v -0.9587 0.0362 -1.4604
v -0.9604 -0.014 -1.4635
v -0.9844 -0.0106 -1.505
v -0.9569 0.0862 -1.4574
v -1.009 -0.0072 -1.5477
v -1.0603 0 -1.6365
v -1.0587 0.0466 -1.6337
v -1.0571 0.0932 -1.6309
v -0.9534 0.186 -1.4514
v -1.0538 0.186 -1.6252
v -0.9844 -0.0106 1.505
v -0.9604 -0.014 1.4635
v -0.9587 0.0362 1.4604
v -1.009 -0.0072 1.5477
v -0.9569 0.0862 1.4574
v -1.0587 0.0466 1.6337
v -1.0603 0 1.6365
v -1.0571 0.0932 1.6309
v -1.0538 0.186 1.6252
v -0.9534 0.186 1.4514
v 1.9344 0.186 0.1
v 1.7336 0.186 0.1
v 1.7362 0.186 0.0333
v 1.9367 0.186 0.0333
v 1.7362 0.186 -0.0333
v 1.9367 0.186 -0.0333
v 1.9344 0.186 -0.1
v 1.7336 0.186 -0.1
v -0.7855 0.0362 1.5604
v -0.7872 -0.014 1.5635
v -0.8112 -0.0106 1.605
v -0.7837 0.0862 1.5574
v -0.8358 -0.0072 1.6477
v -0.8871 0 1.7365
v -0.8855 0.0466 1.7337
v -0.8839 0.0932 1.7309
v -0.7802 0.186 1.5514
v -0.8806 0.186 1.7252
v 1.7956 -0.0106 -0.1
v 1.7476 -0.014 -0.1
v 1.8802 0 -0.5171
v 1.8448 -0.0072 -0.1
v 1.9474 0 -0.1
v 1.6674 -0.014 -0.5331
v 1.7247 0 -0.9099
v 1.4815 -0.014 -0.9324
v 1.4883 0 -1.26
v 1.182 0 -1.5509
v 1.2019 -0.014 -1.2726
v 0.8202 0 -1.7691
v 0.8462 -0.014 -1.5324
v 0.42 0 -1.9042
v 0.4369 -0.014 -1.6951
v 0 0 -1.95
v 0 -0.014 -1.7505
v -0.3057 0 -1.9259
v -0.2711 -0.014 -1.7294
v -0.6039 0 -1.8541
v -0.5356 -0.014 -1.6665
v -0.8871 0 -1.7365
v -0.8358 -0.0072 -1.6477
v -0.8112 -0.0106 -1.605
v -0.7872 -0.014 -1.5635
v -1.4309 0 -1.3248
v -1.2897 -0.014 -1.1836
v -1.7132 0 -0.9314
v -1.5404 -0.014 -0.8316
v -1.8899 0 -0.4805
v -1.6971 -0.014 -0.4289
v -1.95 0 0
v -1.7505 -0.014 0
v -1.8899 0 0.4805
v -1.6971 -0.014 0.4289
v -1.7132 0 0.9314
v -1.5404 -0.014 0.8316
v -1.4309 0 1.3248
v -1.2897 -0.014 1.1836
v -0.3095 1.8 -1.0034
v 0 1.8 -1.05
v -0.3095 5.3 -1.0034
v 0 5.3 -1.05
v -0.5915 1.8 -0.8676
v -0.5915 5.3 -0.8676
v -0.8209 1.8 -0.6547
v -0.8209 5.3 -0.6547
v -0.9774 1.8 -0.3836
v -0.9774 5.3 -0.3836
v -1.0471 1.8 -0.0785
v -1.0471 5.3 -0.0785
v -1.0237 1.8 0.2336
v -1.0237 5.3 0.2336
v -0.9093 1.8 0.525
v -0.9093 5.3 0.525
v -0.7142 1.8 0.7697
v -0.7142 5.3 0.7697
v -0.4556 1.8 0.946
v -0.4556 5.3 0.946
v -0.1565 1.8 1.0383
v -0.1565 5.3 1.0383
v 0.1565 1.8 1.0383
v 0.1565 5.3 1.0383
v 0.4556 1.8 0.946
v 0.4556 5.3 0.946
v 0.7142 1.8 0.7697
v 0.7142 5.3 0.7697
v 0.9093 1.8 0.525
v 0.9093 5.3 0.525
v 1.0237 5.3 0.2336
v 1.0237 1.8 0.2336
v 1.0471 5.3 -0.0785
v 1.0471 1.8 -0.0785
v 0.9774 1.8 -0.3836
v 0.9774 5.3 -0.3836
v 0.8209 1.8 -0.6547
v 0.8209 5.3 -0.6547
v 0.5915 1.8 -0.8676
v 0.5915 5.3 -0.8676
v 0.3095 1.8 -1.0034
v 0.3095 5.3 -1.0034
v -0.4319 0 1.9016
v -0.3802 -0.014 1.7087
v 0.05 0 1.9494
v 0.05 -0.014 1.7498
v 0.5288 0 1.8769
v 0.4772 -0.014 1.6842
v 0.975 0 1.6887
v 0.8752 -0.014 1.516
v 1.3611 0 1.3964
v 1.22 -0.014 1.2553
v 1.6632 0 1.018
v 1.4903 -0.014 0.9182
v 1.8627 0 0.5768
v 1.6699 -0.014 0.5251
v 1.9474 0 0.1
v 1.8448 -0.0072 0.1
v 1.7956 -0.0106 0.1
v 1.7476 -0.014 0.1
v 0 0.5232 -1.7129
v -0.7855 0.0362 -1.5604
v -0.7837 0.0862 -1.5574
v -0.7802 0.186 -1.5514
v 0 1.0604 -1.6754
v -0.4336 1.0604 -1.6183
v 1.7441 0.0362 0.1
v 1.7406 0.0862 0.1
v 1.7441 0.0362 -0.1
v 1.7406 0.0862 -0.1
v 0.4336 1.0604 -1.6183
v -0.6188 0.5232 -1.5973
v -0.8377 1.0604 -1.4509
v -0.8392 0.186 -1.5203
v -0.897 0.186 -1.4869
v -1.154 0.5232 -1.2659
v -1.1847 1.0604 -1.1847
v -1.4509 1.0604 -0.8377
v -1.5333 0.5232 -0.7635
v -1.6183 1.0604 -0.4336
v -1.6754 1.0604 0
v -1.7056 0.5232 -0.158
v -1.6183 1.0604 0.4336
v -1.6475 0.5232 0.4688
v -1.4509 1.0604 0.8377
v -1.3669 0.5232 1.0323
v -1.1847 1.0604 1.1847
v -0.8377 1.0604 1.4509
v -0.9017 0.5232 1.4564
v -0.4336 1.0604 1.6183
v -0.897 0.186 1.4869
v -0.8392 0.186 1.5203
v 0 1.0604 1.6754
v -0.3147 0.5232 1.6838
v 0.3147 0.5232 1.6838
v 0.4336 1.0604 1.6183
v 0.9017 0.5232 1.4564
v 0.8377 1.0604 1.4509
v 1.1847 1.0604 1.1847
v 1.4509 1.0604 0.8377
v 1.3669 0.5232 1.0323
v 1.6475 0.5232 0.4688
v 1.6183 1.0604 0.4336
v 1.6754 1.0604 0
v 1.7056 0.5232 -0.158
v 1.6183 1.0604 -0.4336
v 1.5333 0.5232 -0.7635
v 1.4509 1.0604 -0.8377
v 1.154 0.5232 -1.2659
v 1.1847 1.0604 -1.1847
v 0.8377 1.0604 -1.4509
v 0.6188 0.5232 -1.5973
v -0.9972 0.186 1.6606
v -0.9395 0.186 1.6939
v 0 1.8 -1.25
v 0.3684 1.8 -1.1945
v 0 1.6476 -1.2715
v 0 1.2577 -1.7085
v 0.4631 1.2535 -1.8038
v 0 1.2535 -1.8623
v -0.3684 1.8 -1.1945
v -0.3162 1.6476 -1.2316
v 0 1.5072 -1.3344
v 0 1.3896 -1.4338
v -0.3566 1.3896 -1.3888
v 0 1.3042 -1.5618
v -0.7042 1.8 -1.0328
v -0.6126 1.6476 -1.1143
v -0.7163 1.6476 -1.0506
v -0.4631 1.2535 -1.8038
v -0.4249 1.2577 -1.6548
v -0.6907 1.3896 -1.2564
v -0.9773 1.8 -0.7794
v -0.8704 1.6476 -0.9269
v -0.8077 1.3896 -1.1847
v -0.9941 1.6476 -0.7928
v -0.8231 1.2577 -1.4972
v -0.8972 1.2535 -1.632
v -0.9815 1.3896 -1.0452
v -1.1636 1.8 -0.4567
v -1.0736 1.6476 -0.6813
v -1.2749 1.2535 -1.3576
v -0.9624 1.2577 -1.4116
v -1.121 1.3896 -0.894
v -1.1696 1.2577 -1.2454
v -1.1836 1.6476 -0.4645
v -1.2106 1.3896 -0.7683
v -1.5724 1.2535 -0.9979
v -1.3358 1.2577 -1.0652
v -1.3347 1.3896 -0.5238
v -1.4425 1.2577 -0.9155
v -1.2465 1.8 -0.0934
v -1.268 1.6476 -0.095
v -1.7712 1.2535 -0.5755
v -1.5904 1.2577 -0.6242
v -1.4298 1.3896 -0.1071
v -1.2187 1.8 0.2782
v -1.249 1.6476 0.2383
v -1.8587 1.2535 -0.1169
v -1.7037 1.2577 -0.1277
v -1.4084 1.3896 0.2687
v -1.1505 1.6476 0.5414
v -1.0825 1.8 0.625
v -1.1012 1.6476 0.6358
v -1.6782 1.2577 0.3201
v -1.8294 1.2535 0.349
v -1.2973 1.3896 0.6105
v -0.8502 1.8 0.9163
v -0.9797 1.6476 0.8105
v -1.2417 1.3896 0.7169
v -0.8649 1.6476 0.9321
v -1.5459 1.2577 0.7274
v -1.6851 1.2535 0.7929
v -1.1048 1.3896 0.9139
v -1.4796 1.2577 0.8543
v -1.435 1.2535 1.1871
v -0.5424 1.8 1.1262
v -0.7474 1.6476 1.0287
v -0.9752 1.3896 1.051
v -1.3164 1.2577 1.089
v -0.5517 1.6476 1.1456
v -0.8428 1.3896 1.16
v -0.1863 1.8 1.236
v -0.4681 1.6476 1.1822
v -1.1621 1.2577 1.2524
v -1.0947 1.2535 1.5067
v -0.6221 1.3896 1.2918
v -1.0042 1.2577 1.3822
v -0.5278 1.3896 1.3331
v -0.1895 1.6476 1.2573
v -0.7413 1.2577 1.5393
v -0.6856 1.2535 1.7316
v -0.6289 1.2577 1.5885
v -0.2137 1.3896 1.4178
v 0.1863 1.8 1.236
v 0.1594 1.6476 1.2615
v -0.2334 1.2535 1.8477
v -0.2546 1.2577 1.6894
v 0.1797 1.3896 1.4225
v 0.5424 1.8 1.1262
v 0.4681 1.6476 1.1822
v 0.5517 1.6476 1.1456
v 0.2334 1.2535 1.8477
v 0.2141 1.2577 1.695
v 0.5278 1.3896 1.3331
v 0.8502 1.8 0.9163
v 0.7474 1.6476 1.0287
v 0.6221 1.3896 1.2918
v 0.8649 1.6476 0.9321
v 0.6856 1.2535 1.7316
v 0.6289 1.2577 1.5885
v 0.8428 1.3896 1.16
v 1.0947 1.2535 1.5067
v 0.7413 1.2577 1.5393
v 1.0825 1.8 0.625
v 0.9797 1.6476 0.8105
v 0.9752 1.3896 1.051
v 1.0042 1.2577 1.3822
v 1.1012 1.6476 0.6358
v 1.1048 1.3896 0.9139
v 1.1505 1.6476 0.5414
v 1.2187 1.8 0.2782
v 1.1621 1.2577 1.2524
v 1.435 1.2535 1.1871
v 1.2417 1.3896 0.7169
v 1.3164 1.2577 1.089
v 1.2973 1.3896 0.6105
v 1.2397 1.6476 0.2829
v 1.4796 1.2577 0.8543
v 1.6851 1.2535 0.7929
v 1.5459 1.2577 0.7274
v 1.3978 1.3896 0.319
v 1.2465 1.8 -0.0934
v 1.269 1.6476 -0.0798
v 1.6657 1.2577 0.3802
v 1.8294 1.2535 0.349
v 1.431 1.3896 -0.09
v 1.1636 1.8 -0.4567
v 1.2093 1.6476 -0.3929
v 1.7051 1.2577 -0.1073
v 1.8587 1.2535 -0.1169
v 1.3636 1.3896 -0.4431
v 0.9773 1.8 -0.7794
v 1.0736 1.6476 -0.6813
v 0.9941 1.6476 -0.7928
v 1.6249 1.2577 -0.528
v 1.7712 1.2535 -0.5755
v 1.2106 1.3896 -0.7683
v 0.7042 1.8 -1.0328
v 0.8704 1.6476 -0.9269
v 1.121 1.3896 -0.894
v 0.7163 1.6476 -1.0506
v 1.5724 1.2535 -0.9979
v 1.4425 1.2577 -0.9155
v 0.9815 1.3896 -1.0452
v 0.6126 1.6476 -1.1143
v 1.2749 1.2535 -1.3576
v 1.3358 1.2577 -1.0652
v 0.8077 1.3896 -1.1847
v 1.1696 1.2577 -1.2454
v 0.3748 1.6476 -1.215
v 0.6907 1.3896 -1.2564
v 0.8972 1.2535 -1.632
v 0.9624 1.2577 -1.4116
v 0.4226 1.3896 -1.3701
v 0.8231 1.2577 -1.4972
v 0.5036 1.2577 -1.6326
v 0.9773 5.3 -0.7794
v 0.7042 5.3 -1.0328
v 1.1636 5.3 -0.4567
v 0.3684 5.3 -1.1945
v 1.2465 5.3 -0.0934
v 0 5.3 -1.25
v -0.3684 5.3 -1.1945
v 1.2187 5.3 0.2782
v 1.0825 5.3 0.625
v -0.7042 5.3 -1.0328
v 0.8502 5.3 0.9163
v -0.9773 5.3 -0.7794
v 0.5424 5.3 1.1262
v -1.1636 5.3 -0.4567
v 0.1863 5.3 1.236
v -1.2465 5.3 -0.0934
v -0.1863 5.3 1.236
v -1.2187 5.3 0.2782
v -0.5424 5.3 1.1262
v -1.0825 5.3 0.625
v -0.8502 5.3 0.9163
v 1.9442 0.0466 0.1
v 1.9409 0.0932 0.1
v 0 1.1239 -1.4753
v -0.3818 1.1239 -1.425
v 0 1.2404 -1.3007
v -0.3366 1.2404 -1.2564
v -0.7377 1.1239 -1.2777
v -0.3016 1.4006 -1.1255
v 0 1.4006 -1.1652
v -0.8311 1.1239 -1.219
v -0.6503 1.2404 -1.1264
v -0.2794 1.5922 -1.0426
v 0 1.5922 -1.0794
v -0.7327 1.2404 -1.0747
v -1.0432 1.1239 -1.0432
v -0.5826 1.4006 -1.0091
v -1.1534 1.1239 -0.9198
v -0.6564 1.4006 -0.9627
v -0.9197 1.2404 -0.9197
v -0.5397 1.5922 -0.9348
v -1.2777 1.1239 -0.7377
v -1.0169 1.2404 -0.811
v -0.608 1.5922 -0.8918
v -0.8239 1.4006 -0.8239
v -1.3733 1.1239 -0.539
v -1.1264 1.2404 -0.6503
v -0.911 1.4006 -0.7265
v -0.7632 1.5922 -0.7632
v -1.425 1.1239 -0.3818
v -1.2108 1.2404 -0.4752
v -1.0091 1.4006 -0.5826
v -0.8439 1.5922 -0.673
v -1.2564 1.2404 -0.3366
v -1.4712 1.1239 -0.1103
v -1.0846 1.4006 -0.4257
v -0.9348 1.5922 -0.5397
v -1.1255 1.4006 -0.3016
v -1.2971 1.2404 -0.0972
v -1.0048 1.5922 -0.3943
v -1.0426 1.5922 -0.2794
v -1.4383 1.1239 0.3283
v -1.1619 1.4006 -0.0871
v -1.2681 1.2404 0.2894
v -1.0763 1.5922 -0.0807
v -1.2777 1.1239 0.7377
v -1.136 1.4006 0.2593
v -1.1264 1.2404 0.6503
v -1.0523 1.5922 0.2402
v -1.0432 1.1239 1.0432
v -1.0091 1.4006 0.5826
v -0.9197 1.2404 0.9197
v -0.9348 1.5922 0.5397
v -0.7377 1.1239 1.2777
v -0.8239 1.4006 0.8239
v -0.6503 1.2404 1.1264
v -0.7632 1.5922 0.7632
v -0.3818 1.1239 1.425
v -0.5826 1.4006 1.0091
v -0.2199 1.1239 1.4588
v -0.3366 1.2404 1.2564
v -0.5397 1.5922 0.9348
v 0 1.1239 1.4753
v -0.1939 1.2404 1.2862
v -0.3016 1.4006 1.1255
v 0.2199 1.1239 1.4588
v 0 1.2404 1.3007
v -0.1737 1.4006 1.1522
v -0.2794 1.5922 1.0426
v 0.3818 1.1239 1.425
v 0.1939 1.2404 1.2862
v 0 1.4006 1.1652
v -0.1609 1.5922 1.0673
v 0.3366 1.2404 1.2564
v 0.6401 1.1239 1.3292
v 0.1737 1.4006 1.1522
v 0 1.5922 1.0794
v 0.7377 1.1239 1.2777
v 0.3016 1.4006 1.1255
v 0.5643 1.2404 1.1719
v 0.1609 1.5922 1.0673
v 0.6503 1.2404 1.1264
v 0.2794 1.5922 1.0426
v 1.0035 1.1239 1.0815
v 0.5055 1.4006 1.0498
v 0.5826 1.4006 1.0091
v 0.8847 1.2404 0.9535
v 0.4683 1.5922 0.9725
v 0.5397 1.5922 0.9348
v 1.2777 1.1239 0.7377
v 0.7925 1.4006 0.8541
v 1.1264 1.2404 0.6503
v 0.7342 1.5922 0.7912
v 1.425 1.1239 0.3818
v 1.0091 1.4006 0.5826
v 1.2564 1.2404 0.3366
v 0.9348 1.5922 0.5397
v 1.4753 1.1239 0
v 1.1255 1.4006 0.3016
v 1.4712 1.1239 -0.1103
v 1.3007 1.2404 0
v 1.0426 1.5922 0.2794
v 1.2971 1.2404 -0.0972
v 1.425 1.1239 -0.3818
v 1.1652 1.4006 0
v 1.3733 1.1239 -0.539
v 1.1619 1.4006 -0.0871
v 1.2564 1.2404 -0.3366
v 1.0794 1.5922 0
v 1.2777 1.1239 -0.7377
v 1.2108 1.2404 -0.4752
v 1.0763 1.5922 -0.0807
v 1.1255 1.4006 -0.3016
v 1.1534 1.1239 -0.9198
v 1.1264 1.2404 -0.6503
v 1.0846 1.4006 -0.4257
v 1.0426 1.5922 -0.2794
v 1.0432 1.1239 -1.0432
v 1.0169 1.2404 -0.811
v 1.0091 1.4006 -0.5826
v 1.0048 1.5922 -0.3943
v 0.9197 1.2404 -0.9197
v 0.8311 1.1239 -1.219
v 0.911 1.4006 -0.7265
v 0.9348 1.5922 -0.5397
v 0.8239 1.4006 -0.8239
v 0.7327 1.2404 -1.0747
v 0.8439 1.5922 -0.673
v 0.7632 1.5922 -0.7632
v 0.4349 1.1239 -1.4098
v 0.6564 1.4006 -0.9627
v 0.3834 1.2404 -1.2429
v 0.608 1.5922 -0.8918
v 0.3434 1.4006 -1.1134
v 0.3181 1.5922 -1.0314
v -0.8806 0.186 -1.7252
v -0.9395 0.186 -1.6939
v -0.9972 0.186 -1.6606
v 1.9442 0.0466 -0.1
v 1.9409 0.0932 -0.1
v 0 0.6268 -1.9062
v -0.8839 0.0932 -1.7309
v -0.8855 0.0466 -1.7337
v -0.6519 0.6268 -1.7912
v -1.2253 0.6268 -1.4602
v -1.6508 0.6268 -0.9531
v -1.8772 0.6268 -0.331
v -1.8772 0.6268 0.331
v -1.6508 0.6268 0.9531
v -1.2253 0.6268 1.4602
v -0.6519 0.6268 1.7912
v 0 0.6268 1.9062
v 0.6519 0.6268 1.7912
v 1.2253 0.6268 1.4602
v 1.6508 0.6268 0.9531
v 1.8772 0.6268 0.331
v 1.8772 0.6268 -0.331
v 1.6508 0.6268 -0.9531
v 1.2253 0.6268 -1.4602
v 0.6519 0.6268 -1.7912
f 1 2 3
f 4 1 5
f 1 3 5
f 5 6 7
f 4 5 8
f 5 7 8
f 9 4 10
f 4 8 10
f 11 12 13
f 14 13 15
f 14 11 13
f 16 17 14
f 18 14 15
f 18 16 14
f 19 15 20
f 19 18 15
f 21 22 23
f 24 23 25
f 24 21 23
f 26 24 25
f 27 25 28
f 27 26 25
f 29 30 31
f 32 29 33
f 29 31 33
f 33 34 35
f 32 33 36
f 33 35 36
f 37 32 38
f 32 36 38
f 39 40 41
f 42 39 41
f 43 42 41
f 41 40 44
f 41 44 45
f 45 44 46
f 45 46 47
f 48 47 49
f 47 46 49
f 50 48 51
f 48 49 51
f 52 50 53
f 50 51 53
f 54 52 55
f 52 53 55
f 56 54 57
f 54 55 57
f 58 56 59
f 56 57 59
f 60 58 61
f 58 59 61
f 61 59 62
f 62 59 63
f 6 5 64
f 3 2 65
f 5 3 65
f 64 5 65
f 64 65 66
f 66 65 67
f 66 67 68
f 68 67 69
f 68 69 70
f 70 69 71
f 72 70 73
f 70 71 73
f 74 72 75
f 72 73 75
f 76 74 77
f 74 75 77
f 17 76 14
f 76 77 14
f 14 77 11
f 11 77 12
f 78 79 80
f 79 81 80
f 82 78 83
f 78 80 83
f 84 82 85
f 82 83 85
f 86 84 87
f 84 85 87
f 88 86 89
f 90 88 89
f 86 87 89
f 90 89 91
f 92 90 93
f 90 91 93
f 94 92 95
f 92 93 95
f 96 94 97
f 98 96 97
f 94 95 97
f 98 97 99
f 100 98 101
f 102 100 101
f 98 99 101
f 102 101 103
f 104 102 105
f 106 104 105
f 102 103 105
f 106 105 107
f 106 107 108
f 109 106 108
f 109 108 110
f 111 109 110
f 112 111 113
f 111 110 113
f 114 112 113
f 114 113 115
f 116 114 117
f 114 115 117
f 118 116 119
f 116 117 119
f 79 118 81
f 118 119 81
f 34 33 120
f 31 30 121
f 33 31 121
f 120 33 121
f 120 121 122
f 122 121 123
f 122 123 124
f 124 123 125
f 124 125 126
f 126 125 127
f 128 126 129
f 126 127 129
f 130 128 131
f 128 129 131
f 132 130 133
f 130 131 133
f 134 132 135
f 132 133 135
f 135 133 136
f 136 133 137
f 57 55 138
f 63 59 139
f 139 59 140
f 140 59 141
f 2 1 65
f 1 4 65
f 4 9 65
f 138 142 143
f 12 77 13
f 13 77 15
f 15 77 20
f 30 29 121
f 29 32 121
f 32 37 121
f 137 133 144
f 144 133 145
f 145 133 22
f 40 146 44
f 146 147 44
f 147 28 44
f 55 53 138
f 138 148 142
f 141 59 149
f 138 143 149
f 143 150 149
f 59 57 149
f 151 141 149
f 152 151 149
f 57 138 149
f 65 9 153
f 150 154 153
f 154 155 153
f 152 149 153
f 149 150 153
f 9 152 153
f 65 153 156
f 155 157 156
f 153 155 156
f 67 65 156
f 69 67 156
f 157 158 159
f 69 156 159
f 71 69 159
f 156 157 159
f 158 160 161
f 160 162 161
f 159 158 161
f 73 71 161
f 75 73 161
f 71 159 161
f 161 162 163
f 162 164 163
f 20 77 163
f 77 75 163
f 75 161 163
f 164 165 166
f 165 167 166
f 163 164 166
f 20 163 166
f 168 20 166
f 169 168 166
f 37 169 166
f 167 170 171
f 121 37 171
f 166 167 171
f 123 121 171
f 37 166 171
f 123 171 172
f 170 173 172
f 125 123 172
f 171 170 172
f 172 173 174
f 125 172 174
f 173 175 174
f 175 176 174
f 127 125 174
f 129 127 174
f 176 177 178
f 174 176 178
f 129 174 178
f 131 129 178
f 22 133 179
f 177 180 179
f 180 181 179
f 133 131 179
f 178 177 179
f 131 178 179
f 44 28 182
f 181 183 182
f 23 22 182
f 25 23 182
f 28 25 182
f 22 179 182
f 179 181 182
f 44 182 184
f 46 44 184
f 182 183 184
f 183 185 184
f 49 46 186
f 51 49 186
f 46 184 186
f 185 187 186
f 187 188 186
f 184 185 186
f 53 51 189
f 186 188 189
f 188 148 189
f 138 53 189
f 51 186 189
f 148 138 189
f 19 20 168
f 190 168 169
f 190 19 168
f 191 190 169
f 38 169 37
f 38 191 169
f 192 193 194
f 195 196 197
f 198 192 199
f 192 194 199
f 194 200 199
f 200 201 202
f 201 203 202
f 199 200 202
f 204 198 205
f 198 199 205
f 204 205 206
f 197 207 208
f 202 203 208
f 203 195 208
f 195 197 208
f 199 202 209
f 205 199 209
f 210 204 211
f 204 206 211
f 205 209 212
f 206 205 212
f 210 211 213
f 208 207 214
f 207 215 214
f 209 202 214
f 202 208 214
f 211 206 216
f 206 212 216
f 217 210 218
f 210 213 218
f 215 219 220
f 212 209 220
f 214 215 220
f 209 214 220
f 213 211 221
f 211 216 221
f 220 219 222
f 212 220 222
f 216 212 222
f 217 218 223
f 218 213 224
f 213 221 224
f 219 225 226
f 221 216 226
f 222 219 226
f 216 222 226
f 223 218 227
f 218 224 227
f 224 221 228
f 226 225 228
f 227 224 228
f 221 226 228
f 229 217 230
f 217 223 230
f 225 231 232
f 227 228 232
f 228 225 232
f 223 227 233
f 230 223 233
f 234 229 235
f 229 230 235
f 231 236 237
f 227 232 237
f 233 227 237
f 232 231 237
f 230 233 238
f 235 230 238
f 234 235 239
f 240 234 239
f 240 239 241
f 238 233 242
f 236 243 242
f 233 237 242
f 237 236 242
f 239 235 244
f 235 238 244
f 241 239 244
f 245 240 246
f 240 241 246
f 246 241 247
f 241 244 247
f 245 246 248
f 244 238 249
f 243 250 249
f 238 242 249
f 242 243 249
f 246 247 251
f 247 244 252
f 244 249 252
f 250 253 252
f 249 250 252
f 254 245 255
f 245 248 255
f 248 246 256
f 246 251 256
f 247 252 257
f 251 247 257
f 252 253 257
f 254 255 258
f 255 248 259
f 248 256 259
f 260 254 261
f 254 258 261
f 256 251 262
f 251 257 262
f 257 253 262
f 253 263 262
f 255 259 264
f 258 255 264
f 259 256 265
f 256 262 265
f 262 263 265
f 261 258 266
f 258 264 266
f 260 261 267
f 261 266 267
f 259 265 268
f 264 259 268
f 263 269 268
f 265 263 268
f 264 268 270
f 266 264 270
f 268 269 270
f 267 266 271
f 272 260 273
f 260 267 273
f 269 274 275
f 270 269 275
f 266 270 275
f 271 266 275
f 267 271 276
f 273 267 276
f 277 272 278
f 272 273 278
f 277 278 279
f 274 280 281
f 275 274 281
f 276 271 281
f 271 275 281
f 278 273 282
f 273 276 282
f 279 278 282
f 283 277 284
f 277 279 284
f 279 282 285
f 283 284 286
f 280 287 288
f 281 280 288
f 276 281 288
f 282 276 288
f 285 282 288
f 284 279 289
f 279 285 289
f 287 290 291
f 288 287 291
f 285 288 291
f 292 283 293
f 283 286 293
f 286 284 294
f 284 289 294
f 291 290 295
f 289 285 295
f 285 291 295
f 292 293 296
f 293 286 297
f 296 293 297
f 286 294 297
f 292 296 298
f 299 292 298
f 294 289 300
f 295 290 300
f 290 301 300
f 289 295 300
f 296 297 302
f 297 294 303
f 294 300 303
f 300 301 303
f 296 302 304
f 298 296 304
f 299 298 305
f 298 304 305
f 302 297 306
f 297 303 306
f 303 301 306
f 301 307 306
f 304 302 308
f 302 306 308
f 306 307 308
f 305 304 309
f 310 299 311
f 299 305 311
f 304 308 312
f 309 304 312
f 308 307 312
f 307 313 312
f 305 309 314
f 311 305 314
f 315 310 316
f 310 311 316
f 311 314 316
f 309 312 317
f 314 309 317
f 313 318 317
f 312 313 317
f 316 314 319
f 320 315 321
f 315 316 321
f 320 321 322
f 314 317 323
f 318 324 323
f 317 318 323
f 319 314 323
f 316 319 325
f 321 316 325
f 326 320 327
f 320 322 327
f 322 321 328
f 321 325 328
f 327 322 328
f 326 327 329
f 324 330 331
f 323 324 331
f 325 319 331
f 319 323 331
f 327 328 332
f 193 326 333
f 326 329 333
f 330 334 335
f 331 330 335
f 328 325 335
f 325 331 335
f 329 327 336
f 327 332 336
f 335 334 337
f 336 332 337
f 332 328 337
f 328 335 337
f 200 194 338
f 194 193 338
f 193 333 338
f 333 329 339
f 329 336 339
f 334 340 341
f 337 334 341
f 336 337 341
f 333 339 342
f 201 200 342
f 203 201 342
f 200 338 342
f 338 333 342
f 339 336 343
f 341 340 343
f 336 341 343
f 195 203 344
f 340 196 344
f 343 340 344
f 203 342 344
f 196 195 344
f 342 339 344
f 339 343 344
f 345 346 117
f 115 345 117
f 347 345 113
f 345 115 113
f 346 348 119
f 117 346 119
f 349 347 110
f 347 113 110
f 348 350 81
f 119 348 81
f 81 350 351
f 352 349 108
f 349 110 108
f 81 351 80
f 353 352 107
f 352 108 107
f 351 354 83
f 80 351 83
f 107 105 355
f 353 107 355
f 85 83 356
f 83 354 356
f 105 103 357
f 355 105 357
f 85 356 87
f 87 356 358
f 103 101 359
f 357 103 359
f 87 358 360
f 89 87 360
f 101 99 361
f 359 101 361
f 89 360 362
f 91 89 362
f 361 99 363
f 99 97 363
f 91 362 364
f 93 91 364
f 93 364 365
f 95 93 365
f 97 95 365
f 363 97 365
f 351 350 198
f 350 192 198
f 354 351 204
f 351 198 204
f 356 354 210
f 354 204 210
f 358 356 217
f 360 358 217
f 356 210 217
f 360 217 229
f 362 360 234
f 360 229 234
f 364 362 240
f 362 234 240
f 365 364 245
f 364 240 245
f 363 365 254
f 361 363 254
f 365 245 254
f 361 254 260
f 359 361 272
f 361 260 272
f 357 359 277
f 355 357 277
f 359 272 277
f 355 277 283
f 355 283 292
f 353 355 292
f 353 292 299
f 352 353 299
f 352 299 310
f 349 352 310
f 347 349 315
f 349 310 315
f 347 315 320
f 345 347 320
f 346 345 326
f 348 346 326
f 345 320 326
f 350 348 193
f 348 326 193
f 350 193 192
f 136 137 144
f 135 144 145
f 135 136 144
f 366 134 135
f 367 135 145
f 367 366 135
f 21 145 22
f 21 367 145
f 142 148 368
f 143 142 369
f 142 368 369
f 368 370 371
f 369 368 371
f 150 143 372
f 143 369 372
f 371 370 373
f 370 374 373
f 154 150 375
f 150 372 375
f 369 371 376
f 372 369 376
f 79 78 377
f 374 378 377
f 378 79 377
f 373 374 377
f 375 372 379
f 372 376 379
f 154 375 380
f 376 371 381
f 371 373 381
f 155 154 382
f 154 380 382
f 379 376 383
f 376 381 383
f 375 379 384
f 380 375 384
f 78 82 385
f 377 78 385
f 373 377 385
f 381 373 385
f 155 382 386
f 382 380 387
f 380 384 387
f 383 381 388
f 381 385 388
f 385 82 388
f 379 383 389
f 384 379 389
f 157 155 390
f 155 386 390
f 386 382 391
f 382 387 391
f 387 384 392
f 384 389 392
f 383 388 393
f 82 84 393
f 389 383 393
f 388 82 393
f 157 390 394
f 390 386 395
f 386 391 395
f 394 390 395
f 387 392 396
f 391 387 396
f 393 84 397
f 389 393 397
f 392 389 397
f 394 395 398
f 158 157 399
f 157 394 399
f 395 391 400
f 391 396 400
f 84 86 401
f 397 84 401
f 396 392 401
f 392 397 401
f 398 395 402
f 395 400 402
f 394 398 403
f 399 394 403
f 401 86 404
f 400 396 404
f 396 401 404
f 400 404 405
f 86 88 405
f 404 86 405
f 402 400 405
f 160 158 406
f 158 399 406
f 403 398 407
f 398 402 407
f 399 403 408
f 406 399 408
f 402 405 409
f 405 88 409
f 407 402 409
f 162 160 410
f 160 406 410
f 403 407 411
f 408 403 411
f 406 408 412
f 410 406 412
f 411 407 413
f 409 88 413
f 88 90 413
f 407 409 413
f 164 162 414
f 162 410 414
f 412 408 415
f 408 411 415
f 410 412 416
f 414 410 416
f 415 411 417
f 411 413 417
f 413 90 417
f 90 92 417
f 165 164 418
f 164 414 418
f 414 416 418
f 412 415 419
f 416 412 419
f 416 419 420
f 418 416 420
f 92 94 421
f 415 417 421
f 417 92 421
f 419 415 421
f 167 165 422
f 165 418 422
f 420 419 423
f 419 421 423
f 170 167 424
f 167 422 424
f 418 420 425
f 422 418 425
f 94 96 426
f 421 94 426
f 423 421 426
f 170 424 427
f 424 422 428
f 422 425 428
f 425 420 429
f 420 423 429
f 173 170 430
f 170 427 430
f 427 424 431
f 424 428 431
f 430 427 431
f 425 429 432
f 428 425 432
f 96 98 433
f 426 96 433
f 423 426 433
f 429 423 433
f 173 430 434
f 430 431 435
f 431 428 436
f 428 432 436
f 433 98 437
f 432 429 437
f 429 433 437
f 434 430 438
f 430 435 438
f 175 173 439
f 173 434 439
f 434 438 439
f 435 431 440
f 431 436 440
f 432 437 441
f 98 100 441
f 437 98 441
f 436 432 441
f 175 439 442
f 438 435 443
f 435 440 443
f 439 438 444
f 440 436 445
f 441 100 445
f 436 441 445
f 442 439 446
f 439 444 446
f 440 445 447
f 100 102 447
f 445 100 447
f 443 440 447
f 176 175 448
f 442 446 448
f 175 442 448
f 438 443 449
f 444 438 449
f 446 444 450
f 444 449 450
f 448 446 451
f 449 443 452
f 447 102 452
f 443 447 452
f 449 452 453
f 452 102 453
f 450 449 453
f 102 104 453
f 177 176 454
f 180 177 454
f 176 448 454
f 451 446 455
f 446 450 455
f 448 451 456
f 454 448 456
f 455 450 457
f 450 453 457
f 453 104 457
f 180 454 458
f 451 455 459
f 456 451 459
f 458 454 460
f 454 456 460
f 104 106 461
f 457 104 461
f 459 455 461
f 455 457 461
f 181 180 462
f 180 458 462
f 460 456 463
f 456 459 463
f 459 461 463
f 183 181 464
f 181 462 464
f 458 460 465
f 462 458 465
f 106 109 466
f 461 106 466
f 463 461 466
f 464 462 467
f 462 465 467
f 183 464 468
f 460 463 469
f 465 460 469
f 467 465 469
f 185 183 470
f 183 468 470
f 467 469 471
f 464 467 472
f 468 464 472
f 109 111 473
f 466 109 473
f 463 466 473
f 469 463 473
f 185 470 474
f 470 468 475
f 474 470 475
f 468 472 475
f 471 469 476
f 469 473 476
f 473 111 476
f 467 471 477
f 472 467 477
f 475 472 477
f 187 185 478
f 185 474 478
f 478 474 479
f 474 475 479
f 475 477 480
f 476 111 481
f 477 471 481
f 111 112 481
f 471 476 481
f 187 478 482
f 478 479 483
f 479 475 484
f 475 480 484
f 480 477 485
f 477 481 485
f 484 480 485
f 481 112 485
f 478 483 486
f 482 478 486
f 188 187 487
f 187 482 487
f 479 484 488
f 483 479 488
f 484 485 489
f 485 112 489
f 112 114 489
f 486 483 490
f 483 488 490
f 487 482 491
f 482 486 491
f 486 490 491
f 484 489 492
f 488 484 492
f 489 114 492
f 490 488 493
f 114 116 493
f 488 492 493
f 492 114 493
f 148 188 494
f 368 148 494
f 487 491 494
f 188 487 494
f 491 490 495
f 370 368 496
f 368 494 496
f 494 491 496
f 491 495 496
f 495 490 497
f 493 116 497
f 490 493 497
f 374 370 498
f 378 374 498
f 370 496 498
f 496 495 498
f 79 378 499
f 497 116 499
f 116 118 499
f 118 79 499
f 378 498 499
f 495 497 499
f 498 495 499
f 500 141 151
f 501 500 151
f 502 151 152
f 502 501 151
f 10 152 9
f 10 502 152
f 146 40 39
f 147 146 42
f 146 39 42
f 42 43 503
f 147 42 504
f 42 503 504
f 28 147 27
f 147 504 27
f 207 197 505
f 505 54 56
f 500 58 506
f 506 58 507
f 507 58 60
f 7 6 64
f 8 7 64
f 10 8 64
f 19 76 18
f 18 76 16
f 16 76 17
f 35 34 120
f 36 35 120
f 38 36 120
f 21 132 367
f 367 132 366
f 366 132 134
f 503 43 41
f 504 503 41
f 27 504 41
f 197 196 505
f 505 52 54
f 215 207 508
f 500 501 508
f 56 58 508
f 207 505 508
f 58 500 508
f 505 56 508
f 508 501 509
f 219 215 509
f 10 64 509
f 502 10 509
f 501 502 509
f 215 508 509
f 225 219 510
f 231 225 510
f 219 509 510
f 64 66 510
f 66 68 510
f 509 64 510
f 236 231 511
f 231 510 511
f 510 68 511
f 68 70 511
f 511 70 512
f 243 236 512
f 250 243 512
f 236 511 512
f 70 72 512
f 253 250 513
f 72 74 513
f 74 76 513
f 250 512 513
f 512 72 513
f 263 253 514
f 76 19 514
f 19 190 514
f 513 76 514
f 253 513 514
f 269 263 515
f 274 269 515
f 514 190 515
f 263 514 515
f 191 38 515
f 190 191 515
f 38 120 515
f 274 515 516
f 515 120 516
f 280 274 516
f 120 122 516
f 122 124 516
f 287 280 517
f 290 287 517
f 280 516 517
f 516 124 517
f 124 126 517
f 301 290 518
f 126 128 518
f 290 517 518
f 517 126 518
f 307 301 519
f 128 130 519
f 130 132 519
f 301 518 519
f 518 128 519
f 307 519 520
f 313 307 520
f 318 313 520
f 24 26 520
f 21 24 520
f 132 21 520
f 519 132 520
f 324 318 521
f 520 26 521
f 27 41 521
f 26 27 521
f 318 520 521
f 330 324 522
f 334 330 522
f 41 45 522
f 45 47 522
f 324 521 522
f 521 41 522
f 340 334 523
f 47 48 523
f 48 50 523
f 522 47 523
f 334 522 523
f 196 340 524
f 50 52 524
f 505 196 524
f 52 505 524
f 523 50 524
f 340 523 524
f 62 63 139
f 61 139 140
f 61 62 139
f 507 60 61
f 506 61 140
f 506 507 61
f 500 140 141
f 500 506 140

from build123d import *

# Parameters (mm, degrees)
SZKIC8_W                    = 0.2
SZKIC8_H                    = 0.4
WYTNIJ_WYCI_GNI_CIE11_DEPTH = 0.26
SZYK_KO_OWY1_COUNT          = 3


with BuildPart() as part:
    # Szkic2 → Obrót-cienka ścianka3 (revolve)
    with BuildSketch(Plane(origin=(0, 0, 0), x_dir=(0, 0, -1), z_dir=(1, 0, 0))):
        with BuildLine():
            Line((1.25, 5.3), (1.25, 1.8))
            ThreePointArc((1.25, 1.8), (1.433795811, 1.38964102), (1.862343608, 1.25354481))
            Line((1.862343608, 1.25354481), (1.95, 0))
            Line((1.95, 0), (1.75048719, -0.013951295))
            Line((1.75048719, -0.013951295), (1.675359173, 1.060429406))
            ThreePointArc((1.675359173, 1.060429406), (1.227295617, 1.315737995), (1.05, 1.8))
            Line((1.05, 1.8), (1.05, 5.3))
            Line((1.05, 5.3), (1.25, 5.3))
        make_face()
    revolve(axis=Axis((0, 0, 0), (0, 1, 0)))

    # Szkic8 → Wytnij-wyciągnięcie11 (cut)
    with BuildSketch(Plane(origin=(1.95, 0, 0), x_dir=(0, 0, -1), z_dir=(1, 0, 0))):
        with Locations((0, -0.013951295)):
            Rectangle(SZKIC8_W, SZKIC8_H)
    wytnij_wyci_gni_cie11 = extrude(amount=-WYTNIJ_WYCI_GNI_CIE11_DEPTH, mode=Mode.SUBTRACT)

    # Szyk kołowy1: Wytnij-wyciągnięcie11 ×3 about axis
    szyk_ko_owy1_axis = Axis((0, 0, 0), (0, 1, 0))
    for i in range(1, SZYK_KO_OWY1_COUNT):
        add(wytnij_wyci_gni_cie11.rotate(szyk_ko_owy1_axis, i * 360 / SZYK_KO_OWY1_COUNT), mode=Mode.SUBTRACT)


solid = part.part
